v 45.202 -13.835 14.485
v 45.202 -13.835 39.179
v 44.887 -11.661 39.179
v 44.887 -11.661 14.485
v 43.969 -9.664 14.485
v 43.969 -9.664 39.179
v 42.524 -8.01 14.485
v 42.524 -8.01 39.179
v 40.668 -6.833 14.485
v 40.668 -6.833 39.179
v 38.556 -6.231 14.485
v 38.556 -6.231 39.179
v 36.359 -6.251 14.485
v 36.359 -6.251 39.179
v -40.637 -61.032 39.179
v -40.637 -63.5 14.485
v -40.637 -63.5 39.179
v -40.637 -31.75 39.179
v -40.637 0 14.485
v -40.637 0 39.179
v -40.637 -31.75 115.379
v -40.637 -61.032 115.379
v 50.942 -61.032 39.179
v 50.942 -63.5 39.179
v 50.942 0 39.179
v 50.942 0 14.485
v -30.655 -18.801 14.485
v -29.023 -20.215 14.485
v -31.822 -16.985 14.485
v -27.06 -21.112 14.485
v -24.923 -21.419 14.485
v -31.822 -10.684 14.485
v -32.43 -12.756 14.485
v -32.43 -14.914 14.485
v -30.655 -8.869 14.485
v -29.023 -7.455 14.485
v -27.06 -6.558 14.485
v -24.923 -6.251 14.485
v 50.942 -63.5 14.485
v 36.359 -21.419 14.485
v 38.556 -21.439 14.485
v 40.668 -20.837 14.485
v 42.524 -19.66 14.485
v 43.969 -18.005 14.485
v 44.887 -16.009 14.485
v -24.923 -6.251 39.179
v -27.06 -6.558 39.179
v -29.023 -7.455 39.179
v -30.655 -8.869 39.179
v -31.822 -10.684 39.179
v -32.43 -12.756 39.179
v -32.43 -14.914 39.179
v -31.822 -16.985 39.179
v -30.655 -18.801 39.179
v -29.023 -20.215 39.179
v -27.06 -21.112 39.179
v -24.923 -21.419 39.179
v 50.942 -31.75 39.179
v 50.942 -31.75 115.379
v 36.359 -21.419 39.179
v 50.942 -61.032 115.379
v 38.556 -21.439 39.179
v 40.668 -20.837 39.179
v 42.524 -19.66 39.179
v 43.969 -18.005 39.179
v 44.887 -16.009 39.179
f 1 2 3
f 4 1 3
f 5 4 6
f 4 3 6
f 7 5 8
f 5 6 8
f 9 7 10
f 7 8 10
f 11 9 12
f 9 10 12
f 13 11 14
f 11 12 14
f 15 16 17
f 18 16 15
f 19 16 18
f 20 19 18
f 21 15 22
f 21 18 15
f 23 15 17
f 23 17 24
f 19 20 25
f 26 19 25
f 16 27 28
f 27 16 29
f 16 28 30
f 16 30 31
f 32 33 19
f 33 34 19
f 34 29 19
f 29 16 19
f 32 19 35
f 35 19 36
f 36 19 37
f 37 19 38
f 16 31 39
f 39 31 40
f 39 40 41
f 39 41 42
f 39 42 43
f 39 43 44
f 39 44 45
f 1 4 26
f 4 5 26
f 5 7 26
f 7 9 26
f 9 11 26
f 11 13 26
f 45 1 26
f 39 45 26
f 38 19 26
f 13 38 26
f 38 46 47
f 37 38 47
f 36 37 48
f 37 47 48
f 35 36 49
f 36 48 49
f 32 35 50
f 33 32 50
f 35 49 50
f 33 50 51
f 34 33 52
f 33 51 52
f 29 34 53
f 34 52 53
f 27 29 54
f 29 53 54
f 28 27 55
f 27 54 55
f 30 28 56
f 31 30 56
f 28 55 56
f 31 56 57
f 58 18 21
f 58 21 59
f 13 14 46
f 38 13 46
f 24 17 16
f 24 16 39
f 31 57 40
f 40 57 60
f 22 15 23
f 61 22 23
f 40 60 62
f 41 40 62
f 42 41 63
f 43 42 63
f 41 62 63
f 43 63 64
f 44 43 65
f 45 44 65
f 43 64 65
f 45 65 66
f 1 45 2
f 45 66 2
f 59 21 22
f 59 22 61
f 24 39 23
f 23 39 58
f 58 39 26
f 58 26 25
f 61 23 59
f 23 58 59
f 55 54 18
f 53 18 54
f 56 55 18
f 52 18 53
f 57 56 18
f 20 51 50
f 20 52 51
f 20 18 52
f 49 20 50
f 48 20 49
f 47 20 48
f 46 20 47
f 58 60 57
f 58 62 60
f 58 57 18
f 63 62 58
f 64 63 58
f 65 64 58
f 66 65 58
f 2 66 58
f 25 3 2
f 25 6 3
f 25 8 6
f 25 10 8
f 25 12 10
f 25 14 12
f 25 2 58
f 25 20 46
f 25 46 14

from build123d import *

# Parameters (mm, degrees)
F0_W     = 91.5788821876
F0_H     = 24.6932478622
F1_DEPTH = 63.5
F3_DEPTH = 24.6942478622
F4_W     = 91.5788821876
F4_H     = 29.2822020948
F5_DEPTH = 76.2


with BuildPart() as f1:
    # F0 (on Front) → F1 (new body)
    with BuildSketch(Plane.XZ):
        with Locations((5.1525291055, 26.8320306204)):
            Rectangle(F0_W, F0_H)
    extrude(amount=F1_DEPTH)

    # F2 (on face) → F3 (cut, through all)
    with BuildSketch(Plane.XY.offset(39.1786545515)):
        with BuildLine():
            ThreePointArc((-17.3395135884, -13.8349290937), (-19.5607685854, -8.4723451545), (-24.9233525246, -6.2510901575))
            Line((-24.9233525246, -6.2510901575), (-24.9233525246, -21.41876803))
            ThreePointArc((-24.9233525246, -21.41876803), (-19.5607685854, -19.197513033), (-17.3395135884, -13.8349290937))
        make_face()
        with BuildLine():
            Line((36.3587484939, -6.2510901575), (-24.9233525246, -6.2510901575))
            ThreePointArc((-24.9233525246, -6.2510901575), (-19.5607685854, -8.4723451545), (-17.3395135884, -13.8349290937))
            ThreePointArc((-17.3395135884, -13.8349290937), (-19.5607685854, -19.197513033), (-24.9233525246, -21.41876803))
            Line((-24.9233525246, -21.41876803), (36.3587484939, -21.41876803))
            ThreePointArc((36.3587484939, -21.41876803), (29.8547685354, -13.8349290937), (36.3587484939, -6.2510901575))
        make_face()
        with BuildLine():
            Line((-24.9233525246, -21.41876803), (-24.9233525246, -6.2510901575))
            ThreePointArc((-24.9233525246, -6.2510901575), (-32.5071914609, -13.8349290937), (-24.9233525246, -21.41876803))
        make_face()
        with BuildLine():
            ThreePointArc((45.2017359228, -13.8349290937), (42.5236593274, -8.0101321084), (36.3587484939, -6.2510901575))
            Line((36.3587484939, -6.2510901575), (37.5282522291, -6.2510901575))
            Line((37.5282522291, -6.2510901575), (37.5282522291, -21.41876803))
            Line((37.5282522291, -21.41876803), (36.3587484939, -21.41876803))
            ThreePointArc((36.3587484939, -21.41876803), (42.5236593274, -19.659726079), (45.2017359228, -13.8349290937))
        make_face()
        with BuildLine():
            Line((37.5282522291, -6.2510901575), (36.3587484939, -6.2510901575))
            ThreePointArc((36.3587484939, -6.2510901575), (29.8547685354, -13.8349290937), (36.3587484939, -21.41876803))
            Line((36.3587484939, -21.41876803), (37.5282522291, -21.41876803))
            Line((37.5282522291, -21.41876803), (37.5282522291, -6.2510901575))
        make_face()
    extrude(amount=-F3_DEPTH, mode=Mode.SUBTRACT)

    # F4 (on face) → F5 (join)
    with BuildSketch(Plane.XY.offset(39.1786545515)):
        with Locations((5.1525291055, -46.3911010474)):
            Rectangle(F4_W, F4_H)
    extrude(amount=F5_DEPTH)


solid = f1.part
